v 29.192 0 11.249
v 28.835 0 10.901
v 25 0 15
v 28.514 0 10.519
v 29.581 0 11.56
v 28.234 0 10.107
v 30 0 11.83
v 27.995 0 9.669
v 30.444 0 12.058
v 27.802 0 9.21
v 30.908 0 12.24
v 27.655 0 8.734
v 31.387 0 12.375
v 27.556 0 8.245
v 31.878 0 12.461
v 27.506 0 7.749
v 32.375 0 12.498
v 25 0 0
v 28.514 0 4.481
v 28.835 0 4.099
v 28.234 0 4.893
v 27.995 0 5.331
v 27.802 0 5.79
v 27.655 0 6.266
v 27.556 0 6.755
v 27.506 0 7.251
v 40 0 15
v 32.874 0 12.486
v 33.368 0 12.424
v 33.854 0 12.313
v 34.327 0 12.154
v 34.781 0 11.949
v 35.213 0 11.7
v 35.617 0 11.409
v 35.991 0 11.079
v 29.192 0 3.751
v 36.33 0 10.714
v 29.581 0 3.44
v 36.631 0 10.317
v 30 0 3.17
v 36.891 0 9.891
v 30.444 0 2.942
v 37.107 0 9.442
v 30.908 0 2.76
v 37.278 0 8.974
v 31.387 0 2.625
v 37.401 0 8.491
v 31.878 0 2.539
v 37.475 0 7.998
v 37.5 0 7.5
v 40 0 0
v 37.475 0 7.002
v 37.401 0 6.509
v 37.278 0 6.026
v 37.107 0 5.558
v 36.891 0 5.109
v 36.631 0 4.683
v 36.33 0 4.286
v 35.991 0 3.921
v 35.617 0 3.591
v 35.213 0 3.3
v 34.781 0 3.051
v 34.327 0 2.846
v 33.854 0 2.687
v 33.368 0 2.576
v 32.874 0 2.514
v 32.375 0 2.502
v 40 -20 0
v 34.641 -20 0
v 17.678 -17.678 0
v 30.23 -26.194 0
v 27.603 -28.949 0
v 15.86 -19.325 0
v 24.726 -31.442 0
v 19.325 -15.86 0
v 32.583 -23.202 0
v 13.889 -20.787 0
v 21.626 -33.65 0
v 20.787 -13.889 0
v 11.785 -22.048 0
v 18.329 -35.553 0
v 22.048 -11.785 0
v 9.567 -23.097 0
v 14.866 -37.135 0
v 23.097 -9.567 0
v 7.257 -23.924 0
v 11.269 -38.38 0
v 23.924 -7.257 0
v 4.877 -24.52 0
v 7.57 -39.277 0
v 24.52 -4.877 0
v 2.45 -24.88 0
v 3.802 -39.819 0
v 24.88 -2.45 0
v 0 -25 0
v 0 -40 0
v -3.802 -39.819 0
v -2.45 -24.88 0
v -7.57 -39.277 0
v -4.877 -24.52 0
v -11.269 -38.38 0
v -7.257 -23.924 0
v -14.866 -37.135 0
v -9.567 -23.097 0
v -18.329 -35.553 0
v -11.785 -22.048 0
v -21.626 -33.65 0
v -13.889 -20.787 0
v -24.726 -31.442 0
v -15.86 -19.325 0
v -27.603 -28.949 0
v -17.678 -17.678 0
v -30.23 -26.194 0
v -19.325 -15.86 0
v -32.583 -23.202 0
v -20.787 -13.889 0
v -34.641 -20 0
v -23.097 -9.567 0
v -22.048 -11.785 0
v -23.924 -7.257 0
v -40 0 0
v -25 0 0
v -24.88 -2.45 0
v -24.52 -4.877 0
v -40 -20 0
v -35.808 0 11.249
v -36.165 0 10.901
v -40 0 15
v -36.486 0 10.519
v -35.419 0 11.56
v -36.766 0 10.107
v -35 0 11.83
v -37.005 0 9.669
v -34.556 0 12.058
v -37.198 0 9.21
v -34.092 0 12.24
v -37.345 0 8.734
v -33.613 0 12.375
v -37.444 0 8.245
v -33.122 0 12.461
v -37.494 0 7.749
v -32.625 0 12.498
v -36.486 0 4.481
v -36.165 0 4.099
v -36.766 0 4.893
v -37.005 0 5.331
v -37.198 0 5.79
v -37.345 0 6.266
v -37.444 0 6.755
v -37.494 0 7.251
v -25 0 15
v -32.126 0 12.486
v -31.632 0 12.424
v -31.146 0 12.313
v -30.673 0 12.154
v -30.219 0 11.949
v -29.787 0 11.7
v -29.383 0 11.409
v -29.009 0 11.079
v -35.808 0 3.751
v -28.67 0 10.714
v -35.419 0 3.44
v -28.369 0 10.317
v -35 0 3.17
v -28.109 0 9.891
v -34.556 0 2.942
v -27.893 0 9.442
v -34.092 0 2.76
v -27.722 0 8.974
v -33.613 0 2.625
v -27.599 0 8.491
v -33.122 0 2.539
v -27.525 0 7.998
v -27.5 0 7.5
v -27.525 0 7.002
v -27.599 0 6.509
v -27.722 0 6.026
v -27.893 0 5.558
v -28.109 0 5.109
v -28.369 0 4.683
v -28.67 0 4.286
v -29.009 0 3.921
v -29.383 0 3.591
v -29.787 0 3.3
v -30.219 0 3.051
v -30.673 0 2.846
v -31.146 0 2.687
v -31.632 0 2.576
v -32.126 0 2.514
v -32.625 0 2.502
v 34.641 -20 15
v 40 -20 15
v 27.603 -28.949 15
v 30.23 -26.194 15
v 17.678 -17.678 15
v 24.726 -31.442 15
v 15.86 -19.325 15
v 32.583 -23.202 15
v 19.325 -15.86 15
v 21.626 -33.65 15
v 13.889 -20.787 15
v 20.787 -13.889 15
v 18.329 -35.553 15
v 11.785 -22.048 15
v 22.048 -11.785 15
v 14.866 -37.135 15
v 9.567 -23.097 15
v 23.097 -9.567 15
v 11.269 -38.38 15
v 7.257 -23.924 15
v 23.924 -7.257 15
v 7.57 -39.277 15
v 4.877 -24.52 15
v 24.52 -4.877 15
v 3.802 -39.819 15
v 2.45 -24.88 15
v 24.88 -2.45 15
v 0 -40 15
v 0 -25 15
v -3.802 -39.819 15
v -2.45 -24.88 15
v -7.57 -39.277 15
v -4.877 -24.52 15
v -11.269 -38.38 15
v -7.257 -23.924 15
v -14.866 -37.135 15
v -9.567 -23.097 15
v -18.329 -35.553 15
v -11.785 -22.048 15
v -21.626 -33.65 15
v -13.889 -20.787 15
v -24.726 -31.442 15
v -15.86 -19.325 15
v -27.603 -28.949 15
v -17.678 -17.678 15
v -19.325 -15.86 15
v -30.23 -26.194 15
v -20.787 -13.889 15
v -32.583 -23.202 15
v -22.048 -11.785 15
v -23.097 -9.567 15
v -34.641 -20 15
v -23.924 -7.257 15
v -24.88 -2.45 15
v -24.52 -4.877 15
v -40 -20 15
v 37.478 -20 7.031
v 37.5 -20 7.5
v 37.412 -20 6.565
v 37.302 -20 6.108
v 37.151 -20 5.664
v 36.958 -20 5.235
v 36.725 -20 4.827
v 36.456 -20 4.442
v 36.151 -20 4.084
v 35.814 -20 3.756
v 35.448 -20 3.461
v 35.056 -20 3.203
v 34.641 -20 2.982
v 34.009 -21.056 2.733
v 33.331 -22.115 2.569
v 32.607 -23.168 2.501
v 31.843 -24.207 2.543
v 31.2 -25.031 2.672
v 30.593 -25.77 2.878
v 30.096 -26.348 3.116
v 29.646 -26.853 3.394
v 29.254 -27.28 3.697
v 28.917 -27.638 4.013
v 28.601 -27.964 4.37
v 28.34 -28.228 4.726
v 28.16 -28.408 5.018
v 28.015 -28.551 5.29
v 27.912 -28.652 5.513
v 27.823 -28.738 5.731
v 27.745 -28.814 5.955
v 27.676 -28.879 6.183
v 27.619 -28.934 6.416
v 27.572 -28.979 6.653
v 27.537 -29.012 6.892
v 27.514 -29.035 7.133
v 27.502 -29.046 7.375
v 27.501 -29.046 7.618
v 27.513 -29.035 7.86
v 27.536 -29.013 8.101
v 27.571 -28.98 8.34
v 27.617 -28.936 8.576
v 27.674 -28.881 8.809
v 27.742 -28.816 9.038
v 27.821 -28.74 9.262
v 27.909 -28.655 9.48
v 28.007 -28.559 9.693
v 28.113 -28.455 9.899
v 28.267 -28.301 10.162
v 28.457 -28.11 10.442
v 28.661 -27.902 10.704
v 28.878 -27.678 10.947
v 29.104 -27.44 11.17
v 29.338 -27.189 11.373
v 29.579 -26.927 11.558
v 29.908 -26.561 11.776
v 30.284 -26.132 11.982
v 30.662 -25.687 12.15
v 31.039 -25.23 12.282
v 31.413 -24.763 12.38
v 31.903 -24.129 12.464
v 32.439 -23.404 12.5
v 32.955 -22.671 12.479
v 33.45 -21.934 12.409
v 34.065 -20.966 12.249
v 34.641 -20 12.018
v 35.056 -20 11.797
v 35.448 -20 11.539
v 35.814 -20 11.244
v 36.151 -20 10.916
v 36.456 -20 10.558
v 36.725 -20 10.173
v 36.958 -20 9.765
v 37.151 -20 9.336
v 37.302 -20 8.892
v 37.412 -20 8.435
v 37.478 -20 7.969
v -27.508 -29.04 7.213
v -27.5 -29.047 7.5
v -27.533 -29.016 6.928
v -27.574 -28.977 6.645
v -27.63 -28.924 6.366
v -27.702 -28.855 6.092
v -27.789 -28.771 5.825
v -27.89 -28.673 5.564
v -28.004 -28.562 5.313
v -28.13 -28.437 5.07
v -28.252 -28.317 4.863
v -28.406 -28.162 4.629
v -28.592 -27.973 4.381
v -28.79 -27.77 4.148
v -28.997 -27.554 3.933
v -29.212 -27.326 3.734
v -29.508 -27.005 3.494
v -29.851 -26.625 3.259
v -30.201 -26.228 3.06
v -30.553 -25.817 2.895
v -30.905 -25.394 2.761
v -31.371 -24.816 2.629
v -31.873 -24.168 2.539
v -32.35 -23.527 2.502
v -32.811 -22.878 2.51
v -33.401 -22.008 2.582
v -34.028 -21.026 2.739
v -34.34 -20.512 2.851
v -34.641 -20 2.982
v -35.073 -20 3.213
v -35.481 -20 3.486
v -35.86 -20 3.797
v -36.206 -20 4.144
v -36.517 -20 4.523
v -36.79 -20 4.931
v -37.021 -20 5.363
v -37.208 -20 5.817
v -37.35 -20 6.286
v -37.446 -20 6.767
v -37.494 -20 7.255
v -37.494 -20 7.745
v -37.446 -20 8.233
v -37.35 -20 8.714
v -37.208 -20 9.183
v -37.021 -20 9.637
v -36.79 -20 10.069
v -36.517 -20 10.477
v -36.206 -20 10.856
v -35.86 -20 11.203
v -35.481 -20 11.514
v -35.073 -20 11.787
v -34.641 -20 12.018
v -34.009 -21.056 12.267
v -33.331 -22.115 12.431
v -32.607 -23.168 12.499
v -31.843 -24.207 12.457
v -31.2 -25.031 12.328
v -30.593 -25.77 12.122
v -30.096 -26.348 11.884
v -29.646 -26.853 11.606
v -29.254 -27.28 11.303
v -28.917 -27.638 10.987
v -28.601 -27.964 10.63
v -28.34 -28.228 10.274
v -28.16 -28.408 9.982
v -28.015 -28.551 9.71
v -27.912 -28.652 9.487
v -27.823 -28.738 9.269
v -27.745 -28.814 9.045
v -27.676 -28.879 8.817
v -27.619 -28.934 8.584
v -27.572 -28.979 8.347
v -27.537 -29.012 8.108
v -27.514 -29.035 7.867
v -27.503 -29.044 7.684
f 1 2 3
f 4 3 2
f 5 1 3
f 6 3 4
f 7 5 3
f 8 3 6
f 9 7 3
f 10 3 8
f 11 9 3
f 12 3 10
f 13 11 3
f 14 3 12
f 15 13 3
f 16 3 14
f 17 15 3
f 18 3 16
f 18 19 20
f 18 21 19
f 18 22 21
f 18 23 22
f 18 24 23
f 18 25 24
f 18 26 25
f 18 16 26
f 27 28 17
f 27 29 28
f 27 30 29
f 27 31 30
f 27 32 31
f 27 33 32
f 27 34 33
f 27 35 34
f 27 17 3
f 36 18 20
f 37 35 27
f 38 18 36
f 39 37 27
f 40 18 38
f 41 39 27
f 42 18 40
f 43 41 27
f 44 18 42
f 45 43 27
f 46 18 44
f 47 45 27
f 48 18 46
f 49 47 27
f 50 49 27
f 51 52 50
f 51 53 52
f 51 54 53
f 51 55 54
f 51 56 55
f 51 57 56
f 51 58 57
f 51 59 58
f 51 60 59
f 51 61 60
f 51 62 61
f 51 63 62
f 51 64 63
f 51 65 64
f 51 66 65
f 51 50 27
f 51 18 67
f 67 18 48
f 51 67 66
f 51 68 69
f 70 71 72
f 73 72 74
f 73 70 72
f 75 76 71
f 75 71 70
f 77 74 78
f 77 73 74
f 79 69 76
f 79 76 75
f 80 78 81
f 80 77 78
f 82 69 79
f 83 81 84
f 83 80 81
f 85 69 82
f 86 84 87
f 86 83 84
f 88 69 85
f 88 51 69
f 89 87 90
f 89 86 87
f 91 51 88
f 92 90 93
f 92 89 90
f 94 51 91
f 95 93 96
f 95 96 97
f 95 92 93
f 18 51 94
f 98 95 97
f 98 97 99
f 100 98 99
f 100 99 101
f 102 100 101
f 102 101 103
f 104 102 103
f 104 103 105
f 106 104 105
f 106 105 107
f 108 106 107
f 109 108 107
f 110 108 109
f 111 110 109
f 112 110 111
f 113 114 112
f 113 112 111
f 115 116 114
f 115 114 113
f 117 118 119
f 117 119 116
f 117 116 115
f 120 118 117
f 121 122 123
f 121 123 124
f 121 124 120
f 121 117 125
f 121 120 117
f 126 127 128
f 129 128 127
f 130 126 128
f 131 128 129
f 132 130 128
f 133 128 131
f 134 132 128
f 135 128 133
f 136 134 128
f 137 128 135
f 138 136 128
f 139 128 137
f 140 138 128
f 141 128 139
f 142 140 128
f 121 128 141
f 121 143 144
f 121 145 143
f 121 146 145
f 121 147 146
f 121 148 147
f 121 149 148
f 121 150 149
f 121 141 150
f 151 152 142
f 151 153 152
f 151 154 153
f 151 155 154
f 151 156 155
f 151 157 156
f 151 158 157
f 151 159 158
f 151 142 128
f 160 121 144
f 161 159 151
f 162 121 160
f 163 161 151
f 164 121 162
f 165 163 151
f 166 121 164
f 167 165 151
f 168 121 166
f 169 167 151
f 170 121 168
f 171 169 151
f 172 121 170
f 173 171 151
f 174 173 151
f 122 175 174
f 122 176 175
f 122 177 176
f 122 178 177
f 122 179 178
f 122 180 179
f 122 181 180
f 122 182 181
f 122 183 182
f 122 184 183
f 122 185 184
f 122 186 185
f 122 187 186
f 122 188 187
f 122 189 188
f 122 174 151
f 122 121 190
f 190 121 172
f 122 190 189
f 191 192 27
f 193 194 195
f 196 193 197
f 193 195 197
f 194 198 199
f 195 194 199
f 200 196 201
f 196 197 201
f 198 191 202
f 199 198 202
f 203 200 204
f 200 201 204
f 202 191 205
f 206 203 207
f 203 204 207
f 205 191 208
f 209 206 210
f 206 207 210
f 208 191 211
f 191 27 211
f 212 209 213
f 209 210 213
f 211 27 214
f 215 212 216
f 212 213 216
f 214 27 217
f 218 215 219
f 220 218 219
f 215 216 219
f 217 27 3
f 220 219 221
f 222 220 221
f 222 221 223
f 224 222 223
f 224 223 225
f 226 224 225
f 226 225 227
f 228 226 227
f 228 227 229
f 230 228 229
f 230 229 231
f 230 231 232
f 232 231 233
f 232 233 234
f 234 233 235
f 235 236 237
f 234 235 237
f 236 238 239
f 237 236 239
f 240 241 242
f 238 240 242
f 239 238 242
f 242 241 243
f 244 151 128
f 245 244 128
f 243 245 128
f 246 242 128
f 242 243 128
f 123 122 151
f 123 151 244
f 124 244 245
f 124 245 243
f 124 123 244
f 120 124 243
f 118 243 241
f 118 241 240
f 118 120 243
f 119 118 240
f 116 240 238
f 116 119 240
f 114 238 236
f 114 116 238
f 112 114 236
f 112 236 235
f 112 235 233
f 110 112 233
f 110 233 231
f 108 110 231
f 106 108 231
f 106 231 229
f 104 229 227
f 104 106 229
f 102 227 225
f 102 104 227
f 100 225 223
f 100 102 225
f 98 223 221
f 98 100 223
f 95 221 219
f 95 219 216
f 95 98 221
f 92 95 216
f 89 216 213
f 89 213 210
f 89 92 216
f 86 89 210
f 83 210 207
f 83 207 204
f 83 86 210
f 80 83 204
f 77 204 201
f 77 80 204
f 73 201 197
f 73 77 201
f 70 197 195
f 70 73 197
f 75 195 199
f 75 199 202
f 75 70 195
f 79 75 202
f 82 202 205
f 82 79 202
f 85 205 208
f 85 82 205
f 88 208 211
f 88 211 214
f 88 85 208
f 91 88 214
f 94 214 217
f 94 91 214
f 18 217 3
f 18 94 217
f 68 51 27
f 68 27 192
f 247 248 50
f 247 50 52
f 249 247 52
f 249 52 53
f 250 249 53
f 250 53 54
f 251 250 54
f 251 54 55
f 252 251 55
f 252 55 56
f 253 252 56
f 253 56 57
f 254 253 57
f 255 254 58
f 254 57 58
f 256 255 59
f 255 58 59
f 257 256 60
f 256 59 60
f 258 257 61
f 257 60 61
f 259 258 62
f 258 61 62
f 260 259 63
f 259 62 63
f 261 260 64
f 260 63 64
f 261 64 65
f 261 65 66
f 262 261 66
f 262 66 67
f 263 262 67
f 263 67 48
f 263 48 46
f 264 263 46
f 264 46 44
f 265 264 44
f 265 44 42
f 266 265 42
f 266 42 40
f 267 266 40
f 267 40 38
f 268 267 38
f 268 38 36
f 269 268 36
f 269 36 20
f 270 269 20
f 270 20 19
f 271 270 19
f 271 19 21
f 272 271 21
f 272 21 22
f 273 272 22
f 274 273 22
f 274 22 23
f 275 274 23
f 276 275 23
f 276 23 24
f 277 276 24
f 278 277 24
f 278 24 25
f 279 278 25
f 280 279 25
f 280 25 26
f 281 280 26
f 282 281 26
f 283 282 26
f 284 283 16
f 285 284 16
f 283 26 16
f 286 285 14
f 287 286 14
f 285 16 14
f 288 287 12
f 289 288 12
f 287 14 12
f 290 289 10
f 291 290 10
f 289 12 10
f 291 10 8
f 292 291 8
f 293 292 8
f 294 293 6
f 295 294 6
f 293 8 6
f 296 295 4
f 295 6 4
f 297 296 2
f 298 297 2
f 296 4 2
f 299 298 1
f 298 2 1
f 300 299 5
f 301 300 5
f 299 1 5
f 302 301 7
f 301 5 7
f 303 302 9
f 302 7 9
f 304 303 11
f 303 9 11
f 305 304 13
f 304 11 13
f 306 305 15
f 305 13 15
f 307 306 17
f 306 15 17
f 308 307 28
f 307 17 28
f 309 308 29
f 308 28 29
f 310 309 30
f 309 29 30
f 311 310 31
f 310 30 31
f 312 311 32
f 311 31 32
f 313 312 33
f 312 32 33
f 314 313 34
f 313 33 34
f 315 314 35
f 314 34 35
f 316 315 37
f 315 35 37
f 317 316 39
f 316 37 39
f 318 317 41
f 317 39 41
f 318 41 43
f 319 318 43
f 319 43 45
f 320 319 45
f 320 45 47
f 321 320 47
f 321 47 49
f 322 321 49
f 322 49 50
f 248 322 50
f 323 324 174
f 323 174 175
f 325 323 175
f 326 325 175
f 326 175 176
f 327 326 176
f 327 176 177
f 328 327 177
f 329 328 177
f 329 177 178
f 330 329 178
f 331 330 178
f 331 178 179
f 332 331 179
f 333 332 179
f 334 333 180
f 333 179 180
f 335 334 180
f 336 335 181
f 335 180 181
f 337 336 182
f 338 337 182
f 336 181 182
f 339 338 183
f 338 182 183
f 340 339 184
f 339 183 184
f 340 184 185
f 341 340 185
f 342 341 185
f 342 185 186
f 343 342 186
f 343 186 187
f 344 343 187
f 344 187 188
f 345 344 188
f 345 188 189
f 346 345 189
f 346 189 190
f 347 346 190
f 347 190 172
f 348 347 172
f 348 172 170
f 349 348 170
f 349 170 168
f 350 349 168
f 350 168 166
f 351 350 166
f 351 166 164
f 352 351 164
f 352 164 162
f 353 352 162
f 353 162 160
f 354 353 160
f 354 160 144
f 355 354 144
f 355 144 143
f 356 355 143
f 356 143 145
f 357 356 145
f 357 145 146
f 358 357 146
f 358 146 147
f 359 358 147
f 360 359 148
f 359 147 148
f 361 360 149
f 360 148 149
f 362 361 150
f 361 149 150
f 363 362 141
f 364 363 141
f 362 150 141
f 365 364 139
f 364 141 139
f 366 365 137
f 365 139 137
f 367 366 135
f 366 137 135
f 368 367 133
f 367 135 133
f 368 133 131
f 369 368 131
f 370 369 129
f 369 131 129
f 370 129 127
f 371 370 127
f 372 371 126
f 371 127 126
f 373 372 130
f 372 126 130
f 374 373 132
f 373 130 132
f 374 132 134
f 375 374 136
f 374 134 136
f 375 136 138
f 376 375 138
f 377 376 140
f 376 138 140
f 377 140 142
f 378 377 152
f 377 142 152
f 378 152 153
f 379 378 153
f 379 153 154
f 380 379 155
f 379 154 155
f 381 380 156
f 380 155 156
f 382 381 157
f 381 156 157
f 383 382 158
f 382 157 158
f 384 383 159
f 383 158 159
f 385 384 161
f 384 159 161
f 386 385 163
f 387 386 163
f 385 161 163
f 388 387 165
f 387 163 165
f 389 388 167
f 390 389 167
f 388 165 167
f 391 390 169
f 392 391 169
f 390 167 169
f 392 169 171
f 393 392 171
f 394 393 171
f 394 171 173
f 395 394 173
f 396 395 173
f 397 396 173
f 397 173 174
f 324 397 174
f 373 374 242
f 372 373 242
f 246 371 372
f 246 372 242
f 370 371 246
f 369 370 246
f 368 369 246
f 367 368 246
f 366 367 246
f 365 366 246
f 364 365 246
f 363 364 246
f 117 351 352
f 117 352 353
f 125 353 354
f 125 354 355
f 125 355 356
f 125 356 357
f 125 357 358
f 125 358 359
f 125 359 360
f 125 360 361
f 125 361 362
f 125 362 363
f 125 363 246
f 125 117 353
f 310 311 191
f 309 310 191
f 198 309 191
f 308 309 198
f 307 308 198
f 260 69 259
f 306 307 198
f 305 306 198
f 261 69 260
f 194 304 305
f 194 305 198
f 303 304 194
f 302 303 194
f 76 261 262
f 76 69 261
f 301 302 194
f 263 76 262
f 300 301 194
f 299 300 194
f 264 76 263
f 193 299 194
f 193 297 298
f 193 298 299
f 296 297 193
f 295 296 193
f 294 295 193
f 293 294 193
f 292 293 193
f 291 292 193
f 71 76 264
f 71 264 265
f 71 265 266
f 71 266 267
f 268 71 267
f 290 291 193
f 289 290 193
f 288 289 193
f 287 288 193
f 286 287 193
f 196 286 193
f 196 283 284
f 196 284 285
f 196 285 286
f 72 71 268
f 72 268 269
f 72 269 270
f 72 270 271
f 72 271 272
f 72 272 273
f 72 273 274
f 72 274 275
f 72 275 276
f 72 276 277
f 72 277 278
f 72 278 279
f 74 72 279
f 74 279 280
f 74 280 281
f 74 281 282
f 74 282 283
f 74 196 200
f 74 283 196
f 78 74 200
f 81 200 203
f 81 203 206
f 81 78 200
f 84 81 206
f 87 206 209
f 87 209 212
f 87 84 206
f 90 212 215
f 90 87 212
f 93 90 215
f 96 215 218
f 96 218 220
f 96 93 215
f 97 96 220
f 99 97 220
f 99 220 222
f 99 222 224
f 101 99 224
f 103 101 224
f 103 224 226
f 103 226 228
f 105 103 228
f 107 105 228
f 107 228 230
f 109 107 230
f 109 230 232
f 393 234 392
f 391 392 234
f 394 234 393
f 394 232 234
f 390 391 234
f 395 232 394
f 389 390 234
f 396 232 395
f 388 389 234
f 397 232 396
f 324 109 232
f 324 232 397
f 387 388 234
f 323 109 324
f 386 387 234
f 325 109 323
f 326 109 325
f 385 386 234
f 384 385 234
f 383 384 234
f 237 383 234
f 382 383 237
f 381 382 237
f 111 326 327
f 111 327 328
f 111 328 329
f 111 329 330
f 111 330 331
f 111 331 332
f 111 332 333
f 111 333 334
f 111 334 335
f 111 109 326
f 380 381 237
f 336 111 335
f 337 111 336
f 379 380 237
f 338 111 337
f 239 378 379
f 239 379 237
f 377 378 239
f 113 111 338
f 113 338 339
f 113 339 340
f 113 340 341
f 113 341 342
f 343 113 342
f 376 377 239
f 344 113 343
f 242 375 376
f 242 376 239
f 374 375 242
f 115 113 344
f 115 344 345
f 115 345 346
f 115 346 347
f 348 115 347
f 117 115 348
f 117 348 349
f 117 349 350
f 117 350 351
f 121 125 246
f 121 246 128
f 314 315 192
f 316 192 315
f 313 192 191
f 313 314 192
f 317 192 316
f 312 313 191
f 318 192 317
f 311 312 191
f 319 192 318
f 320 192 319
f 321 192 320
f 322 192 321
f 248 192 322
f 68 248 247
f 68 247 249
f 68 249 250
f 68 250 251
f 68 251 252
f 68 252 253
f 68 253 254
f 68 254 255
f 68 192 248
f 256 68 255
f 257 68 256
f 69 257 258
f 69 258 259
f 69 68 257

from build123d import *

# Parameters (mm, degrees)
BOSS_EXTRUDE4_DEPTH = 15
SKETCH5_R           = 5
CUT_EXTRUDE1_DEPTH  = 41


with BuildPart() as part:
    # Sketch2 → Boss-Extrude4 (new body)
    with BuildSketch(Plane.XY):
        with BuildLine():
            Line((-40, 0), (-25, 0))
            ThreePointArc((-25, 0), (0, -25), (25, 0))
            Line((25, 0), (40, 0))
            Line((40, 0), (40, -20))
            Line((40, -20), (34.641016151, -20))
            ThreePointArc((34.641016151, -20), (0, -40), (-34.641016151, -20))
            Line((-34.641016151, -20), (-40, -20))
            Line((-40, -20), (-40, 0))
        make_face()
    extrude(amount=BOSS_EXTRUDE4_DEPTH)

    # Sketch5 → Cut-Extrude1 (cut, through all)
    with BuildSketch(Plane(origin=(0, 0, 0), x_dir=(1, 0, 0), z_dir=(0, 1, 0))):
        with Locations((-32.5, -7.5)):
            Circle(SKETCH5_R)
        with Locations((32.5, -7.5)):
            Circle(SKETCH5_R)
    extrude(amount=-CUT_EXTRUDE1_DEPTH, mode=Mode.SUBTRACT)


solid = part.part
